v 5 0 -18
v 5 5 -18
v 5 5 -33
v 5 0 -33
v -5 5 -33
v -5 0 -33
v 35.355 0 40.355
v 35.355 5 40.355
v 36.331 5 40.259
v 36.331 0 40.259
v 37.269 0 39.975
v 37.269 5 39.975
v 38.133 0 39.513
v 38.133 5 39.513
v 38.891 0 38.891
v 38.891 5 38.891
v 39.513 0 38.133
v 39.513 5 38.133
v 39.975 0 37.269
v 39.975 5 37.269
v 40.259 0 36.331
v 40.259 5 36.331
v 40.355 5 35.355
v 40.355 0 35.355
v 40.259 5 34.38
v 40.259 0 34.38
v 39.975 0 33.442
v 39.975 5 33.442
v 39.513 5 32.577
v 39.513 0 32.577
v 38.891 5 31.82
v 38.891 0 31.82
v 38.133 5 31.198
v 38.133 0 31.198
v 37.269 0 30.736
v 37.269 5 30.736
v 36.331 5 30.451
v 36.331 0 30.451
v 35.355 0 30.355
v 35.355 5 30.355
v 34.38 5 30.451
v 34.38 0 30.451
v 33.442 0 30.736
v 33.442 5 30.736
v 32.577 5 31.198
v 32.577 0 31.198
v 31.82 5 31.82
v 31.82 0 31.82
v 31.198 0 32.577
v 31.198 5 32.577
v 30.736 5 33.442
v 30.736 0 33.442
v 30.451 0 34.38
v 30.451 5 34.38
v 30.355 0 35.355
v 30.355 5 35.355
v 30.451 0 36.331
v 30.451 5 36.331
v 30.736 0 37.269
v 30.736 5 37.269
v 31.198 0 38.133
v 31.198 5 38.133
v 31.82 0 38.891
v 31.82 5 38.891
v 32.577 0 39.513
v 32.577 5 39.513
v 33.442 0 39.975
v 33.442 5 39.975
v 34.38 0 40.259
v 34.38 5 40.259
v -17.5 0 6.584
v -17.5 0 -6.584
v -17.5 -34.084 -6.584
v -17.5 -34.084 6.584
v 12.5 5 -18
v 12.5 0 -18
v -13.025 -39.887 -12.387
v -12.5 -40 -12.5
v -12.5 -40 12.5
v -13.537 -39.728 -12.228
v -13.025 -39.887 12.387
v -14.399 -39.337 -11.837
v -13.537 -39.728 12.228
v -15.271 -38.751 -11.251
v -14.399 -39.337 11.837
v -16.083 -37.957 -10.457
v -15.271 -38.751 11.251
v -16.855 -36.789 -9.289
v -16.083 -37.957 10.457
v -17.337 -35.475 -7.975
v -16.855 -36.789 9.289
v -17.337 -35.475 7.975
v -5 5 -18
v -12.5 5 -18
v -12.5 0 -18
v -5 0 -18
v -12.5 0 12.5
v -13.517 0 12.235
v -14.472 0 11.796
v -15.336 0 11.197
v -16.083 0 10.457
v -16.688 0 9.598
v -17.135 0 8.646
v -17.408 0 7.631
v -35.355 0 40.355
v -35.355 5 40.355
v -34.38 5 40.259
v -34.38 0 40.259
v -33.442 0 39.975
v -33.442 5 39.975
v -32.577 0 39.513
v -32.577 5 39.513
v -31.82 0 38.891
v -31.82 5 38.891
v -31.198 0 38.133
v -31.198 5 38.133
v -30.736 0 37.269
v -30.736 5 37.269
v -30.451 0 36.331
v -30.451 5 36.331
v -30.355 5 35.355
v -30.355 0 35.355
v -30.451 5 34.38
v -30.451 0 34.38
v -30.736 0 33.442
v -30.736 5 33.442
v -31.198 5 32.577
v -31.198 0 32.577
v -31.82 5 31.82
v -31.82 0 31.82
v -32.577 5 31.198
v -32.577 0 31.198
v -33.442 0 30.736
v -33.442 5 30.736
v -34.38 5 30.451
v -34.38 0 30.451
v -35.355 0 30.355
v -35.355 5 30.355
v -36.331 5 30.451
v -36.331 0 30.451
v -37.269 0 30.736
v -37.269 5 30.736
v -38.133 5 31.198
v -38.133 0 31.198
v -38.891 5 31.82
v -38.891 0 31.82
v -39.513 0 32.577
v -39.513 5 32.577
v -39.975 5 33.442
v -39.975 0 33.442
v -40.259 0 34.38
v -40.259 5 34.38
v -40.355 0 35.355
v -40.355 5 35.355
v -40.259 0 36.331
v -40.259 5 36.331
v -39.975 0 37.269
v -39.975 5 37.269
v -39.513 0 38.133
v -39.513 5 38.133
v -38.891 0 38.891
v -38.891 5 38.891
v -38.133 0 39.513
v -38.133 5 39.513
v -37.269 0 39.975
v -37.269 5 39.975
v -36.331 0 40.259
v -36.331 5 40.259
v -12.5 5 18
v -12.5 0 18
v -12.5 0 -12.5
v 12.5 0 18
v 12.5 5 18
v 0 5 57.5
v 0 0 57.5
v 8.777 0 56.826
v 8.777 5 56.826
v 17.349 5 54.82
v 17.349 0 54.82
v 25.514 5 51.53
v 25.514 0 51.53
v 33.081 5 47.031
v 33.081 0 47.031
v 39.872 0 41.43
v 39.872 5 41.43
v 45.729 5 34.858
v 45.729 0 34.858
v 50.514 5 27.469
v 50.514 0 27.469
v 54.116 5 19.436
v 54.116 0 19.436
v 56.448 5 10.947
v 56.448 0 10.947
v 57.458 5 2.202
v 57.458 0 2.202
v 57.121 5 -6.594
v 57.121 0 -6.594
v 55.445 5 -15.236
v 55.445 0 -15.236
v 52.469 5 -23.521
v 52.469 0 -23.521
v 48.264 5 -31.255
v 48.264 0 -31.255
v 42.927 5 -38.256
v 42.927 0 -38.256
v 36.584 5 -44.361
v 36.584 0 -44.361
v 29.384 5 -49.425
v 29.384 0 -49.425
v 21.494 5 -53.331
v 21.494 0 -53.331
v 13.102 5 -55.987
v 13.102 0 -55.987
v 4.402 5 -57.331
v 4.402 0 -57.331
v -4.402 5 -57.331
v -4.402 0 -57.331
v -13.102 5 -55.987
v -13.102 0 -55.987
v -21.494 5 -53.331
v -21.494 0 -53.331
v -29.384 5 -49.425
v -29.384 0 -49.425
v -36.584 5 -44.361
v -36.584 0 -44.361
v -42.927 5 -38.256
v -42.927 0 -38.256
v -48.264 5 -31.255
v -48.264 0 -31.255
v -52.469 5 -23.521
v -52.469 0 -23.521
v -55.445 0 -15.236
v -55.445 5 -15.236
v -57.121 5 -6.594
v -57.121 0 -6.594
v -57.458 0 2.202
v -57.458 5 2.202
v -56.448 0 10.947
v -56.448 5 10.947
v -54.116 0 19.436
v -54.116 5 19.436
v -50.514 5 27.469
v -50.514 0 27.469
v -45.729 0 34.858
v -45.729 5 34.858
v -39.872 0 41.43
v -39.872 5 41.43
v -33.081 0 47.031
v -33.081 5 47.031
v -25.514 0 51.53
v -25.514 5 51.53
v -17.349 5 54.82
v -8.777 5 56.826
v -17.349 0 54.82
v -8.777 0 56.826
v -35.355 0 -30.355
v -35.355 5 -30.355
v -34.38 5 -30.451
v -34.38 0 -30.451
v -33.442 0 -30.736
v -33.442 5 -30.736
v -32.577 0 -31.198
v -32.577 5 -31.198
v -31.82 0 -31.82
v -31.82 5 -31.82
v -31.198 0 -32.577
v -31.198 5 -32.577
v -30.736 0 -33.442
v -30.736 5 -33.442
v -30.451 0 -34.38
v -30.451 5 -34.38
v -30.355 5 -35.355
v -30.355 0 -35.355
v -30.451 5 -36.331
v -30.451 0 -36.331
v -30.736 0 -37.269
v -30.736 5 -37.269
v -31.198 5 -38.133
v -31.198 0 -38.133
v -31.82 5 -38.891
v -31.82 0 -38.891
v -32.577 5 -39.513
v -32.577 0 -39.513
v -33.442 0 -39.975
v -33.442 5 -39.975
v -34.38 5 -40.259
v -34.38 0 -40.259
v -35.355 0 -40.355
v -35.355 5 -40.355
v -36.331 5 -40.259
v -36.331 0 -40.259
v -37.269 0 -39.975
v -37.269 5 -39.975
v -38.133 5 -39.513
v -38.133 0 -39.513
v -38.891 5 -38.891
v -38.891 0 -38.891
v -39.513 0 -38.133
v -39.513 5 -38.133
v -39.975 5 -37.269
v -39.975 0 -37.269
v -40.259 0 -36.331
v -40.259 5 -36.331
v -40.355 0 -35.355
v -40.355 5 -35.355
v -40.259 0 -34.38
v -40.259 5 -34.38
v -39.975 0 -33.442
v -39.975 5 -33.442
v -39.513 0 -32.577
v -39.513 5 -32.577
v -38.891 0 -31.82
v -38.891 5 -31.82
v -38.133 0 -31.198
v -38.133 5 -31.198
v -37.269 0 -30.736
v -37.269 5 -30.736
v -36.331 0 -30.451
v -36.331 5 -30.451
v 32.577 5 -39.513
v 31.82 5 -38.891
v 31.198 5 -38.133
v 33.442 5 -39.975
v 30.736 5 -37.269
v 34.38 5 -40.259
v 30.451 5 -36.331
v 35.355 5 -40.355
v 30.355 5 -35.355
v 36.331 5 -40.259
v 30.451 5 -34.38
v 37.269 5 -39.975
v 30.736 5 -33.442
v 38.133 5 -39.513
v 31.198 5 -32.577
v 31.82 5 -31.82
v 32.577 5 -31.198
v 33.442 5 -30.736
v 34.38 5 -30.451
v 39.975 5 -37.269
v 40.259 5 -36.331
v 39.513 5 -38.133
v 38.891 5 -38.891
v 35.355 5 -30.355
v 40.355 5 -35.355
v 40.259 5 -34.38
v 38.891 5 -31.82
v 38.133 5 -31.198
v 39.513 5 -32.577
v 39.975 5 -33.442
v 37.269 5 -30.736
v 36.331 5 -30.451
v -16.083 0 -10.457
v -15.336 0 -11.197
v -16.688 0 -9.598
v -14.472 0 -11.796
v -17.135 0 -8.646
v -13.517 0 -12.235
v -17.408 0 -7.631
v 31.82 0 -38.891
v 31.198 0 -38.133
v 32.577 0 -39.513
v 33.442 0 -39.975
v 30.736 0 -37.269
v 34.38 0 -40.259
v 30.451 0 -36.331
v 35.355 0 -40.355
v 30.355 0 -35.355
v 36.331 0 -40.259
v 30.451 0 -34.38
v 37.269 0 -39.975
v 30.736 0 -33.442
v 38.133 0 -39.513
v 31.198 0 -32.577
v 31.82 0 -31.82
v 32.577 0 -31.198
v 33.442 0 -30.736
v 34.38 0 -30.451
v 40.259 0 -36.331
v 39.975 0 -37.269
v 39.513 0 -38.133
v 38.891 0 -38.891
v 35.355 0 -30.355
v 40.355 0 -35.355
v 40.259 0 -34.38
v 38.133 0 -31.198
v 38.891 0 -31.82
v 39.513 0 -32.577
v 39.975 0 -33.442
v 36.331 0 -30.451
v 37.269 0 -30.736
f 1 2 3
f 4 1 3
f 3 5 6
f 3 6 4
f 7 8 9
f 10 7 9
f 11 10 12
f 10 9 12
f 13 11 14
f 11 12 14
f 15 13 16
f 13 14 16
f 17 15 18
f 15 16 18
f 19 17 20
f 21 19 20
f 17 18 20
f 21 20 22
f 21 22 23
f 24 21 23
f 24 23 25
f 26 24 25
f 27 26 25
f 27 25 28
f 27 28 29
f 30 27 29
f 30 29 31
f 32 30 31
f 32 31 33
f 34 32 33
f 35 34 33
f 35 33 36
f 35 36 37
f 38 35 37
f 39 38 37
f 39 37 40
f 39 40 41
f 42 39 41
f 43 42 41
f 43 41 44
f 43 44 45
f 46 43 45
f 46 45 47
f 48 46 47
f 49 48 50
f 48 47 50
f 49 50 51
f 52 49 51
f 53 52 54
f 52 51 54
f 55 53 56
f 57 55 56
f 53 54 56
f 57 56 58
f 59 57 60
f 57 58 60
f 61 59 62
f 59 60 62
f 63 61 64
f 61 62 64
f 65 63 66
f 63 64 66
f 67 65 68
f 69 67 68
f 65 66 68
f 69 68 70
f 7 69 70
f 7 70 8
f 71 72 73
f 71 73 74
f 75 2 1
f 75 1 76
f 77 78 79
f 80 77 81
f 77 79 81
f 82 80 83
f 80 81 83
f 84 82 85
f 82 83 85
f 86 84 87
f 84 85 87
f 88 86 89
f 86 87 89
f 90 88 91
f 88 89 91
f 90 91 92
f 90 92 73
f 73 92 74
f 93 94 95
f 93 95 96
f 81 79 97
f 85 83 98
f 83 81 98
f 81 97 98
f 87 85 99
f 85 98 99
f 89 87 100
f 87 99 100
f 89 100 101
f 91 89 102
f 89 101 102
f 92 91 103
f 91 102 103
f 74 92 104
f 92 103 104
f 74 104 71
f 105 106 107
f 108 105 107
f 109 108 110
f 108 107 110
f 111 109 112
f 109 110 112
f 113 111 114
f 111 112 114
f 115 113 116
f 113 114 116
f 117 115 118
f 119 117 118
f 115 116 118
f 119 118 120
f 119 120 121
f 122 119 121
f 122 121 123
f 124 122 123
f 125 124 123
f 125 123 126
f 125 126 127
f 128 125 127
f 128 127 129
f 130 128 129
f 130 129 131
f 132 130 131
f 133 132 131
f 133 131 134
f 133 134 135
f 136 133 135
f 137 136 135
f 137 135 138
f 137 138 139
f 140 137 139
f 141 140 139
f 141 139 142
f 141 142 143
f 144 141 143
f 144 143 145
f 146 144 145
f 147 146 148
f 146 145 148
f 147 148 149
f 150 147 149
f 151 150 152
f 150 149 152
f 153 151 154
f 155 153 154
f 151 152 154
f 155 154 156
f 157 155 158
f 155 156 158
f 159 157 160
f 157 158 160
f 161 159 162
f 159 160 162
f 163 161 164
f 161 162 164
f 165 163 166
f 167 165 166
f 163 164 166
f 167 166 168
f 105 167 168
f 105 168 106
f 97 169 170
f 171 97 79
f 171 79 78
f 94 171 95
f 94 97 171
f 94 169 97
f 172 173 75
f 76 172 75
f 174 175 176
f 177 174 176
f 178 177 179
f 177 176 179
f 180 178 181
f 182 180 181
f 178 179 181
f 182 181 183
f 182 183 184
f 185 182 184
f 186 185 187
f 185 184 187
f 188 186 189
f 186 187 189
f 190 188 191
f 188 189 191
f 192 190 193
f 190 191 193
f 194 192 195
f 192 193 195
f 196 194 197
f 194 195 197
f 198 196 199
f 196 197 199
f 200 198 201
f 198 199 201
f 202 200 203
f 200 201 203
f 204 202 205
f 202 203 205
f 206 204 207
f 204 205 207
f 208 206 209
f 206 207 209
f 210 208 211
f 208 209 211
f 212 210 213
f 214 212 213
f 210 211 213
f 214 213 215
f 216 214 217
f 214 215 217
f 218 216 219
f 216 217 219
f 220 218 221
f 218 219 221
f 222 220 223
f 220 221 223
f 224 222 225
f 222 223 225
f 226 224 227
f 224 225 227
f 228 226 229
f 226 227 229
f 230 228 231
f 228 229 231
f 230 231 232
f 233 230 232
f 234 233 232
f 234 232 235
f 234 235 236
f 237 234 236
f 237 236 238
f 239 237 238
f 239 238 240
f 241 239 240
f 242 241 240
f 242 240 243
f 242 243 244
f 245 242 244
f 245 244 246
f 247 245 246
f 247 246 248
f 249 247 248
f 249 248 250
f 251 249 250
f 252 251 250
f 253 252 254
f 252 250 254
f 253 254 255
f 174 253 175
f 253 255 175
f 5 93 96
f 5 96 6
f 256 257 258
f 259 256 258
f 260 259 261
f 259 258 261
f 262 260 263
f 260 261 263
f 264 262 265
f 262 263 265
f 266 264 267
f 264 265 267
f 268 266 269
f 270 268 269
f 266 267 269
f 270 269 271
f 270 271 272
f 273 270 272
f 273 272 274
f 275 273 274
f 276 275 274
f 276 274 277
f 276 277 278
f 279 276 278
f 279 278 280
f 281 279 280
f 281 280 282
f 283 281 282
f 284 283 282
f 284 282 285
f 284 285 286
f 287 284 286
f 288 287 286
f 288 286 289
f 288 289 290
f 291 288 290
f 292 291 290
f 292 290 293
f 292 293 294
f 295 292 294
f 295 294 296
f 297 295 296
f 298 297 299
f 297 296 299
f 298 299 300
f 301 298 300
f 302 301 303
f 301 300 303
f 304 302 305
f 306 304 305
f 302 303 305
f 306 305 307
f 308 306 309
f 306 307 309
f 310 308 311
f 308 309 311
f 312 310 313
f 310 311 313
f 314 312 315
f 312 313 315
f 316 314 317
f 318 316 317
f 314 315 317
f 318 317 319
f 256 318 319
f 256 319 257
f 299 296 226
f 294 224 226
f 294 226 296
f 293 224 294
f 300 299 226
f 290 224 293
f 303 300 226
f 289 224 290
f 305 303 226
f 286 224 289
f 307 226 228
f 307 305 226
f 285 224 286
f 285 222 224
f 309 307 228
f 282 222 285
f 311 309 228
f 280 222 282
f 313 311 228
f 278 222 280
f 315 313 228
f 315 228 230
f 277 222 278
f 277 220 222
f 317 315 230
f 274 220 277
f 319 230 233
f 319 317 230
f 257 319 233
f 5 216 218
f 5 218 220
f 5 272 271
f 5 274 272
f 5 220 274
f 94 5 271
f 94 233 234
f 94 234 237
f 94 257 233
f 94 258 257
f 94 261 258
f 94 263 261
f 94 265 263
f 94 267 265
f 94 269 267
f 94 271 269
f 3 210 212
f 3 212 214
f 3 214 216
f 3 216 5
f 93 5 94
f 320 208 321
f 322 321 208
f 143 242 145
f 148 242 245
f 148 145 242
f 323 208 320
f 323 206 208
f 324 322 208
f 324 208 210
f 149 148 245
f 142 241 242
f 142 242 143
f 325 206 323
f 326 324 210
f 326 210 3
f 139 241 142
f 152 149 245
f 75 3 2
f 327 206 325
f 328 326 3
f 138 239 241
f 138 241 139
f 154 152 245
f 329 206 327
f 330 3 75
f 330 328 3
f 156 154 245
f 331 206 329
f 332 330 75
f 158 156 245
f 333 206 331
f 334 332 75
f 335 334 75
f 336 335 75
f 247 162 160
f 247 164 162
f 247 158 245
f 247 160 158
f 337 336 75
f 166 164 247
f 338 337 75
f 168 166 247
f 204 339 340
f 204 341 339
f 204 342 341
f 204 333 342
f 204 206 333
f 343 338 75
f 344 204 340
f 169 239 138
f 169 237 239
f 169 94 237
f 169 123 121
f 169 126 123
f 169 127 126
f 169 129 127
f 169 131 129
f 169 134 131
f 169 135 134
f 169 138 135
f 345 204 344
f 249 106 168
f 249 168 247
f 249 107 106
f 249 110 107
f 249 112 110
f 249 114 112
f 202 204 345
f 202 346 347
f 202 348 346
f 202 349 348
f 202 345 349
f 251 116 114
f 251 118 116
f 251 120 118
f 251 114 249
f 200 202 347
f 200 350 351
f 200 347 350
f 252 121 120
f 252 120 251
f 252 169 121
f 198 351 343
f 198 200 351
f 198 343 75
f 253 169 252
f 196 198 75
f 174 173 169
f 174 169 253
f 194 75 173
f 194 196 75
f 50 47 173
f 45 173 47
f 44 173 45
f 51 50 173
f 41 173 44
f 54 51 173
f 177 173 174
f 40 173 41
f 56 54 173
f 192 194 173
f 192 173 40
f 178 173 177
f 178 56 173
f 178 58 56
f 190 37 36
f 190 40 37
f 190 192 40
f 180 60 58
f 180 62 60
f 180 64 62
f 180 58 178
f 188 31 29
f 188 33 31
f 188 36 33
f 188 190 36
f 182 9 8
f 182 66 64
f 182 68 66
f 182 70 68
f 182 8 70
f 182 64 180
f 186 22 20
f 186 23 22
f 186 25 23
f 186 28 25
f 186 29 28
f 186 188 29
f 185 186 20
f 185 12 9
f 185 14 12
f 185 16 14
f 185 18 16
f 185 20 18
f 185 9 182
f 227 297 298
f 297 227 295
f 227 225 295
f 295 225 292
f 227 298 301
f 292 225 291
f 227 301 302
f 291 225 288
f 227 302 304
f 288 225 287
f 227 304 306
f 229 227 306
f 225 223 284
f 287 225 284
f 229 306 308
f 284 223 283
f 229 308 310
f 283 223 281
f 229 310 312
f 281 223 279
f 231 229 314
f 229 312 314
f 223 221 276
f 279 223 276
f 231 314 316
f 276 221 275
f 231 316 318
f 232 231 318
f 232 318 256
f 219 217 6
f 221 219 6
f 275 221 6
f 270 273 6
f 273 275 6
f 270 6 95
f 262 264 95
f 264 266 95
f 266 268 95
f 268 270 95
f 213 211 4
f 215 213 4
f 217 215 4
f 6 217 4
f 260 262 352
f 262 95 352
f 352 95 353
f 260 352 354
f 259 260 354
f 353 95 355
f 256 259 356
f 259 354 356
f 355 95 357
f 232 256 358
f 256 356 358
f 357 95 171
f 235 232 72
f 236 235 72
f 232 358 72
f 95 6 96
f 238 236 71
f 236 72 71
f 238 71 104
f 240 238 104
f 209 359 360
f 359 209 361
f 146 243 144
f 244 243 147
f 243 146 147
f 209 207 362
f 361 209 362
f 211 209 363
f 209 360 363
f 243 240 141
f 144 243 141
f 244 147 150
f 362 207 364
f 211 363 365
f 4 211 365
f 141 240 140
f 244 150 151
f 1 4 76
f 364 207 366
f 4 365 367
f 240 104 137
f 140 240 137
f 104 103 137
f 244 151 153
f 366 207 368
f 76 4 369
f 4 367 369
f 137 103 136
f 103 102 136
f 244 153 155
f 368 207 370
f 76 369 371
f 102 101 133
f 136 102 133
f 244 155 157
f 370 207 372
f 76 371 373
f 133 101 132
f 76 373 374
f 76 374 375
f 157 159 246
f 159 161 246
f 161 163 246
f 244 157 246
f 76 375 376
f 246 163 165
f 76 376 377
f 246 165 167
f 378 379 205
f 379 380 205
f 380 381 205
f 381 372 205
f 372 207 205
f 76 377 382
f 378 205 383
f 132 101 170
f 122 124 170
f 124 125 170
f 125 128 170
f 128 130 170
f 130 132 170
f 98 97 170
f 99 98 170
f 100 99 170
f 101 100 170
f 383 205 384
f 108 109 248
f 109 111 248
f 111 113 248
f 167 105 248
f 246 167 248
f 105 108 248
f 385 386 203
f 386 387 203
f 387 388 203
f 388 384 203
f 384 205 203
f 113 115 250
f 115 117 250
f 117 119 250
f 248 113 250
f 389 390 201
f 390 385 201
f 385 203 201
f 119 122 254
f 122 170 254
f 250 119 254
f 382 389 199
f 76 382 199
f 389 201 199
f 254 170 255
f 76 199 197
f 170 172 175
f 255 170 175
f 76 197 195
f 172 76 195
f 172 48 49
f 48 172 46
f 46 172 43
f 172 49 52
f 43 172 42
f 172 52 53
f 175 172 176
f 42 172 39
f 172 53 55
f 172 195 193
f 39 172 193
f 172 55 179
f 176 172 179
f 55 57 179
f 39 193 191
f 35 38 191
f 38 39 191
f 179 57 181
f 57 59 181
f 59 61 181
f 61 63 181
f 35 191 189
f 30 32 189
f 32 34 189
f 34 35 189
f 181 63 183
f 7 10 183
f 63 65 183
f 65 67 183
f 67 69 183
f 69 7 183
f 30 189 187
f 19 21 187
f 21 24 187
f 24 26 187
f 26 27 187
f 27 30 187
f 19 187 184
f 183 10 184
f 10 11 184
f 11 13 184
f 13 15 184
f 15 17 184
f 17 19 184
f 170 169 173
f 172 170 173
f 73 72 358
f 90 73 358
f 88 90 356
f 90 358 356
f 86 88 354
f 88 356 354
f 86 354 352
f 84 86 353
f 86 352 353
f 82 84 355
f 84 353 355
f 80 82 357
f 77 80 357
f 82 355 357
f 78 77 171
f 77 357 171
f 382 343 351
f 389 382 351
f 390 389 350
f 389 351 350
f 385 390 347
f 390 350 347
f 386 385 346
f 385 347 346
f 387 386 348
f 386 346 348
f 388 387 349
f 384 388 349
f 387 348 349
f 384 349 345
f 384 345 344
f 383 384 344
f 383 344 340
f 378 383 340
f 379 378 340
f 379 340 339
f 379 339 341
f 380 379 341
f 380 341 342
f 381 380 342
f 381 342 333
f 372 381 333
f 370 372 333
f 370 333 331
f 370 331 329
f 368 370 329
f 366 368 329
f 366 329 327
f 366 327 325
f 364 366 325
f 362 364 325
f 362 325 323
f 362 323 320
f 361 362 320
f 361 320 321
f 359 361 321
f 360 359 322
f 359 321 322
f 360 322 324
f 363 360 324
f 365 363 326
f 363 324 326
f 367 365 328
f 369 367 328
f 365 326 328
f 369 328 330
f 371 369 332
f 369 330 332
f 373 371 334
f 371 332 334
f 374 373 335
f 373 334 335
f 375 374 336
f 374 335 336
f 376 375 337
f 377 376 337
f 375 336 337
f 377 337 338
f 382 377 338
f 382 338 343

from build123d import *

# Parameters (mm, degrees)
SKETCH2_R           = 57.5
BOSS_EXTRUDE1_DEPTH = 5
SKETCH3_R           = 5
CUT_EXTRUDE1_DEPTH  = 82.470853684
SKETCH4_W           = 25
SKETCH4_H           = 36
CUT_EXTRUDE2_DEPTH  = 82.470853684
SKETCH5_W           = 5
SKETCH5_H           = 25
BOSS_EXTRUDE2_DEPTH = 40
FILLET1_R           = 6
SKETCH7_W           = 10
SKETCH7_H           = 15
CUT_EXTRUDE3_DEPTH  = 93.938151477


with BuildPart() as part:
    # Sketch2 → Boss-Extrude1 (new body)
    with BuildSketch(Plane(origin=(0, 0, 0), x_dir=(1, 0, 0), z_dir=(0, 1, 0))):
        with Locations(Location((0, 0, 0), (0, 0, 270))):
            Circle(SKETCH2_R)
    extrude(amount=BOSS_EXTRUDE1_DEPTH)

    # Sketch3 → Cut-Extrude1 (cut, through all)
    with BuildSketch(Plane(origin=(0, 5, 0), x_dir=(1, 0, 0), z_dir=(0, 1, 0))):
        with Locations(Location((-35.355339059, 35.355339059, 0), (0, 0, 270))):
            Circle(SKETCH3_R)
        with Locations(Location((35.355339059, 35.355339059, 0), (0, 0, 270))):
            Circle(SKETCH3_R)
        with Locations(Location((35.355339059, -35.355339059, 0), (0, 0, 270))):
            Circle(SKETCH3_R)
        with Locations(Location((-35.355339059, -35.355339059, 0), (0, 0, 270))):
            Circle(SKETCH3_R)
    extrude(amount=-CUT_EXTRUDE1_DEPTH, mode=Mode.SUBTRACT)

    # Sketch4 → Cut-Extrude2 (cut, through all)
    with BuildSketch(Plane(origin=(0, 5, 0), x_dir=(1, 0, 0), z_dir=(0, 1, 0))):
        Rectangle(SKETCH4_W, SKETCH4_H)
    extrude(amount=-CUT_EXTRUDE2_DEPTH, mode=Mode.SUBTRACT)

    # Sketch5 → Boss-Extrude2 (add)
    with BuildSketch(Plane.XZ):
        with Locations((-15, 0)):
            Rectangle(SKETCH5_W, SKETCH5_H)
    extrude(amount=BOSS_EXTRUDE2_DEPTH)

    # Fillet1
    # the kernel refuses this fillet: 6 mm, written as the material it takes off along each edge
    with BuildSketch(Plane(origin=(-17.5, -40, 27.290199458), x_dir=(0, 1, 0), z_dir=(0, 0, -1))) as fillet1_piece_1:
        with BuildLine():
            CenterArc((5.916079783, 6), FILLET1_R, 189.594068227, 80.405931773)
            Line((0, 5), (0, 0))
            Line((0, 0), (5.916079783, 0))
        make_face()
    extrude(amount=54.580398916, mode=Mode.SUBTRACT)
    with BuildSketch(Plane(origin=(-17.5, 0, -12.5), x_dir=(1, 0, 0), z_dir=(0, -1, 0))) as fillet1_piece_2:
        with BuildLine():
            CenterArc((6, 5.916079783), FILLET1_R, 180, 80.405931773)
            Line((0, 5.916079783), (0, 0))
            Line((0, 0), (5, 0))
        make_face()
    extrude(amount=54.790199458, mode=Mode.SUBTRACT)
    with BuildSketch(Plane(origin=(-17.5, 0, 12.5), x_dir=(0, 0, -1), z_dir=(0, -1, 0))) as fillet1_piece_3:
        with BuildLine():
            CenterArc((5.916079783, 6), FILLET1_R, 189.594068227, 80.405931773)
            Line((0, 5), (0, 0))
            Line((0, 0), (5.916079783, 0))
        make_face()
    extrude(amount=54.790199458, mode=Mode.SUBTRACT)

    # Sketch7 → Cut-Extrude3 (cut, through all)
    with BuildSketch(Plane(origin=(0, 5, 0), x_dir=(1, 0, 0), z_dir=(0, 1, 0))):
        with Locations((0, 25.5)):
            Rectangle(SKETCH7_W, SKETCH7_H)
    extrude(amount=-CUT_EXTRUDE3_DEPTH, mode=Mode.SUBTRACT)


solid = part.part
